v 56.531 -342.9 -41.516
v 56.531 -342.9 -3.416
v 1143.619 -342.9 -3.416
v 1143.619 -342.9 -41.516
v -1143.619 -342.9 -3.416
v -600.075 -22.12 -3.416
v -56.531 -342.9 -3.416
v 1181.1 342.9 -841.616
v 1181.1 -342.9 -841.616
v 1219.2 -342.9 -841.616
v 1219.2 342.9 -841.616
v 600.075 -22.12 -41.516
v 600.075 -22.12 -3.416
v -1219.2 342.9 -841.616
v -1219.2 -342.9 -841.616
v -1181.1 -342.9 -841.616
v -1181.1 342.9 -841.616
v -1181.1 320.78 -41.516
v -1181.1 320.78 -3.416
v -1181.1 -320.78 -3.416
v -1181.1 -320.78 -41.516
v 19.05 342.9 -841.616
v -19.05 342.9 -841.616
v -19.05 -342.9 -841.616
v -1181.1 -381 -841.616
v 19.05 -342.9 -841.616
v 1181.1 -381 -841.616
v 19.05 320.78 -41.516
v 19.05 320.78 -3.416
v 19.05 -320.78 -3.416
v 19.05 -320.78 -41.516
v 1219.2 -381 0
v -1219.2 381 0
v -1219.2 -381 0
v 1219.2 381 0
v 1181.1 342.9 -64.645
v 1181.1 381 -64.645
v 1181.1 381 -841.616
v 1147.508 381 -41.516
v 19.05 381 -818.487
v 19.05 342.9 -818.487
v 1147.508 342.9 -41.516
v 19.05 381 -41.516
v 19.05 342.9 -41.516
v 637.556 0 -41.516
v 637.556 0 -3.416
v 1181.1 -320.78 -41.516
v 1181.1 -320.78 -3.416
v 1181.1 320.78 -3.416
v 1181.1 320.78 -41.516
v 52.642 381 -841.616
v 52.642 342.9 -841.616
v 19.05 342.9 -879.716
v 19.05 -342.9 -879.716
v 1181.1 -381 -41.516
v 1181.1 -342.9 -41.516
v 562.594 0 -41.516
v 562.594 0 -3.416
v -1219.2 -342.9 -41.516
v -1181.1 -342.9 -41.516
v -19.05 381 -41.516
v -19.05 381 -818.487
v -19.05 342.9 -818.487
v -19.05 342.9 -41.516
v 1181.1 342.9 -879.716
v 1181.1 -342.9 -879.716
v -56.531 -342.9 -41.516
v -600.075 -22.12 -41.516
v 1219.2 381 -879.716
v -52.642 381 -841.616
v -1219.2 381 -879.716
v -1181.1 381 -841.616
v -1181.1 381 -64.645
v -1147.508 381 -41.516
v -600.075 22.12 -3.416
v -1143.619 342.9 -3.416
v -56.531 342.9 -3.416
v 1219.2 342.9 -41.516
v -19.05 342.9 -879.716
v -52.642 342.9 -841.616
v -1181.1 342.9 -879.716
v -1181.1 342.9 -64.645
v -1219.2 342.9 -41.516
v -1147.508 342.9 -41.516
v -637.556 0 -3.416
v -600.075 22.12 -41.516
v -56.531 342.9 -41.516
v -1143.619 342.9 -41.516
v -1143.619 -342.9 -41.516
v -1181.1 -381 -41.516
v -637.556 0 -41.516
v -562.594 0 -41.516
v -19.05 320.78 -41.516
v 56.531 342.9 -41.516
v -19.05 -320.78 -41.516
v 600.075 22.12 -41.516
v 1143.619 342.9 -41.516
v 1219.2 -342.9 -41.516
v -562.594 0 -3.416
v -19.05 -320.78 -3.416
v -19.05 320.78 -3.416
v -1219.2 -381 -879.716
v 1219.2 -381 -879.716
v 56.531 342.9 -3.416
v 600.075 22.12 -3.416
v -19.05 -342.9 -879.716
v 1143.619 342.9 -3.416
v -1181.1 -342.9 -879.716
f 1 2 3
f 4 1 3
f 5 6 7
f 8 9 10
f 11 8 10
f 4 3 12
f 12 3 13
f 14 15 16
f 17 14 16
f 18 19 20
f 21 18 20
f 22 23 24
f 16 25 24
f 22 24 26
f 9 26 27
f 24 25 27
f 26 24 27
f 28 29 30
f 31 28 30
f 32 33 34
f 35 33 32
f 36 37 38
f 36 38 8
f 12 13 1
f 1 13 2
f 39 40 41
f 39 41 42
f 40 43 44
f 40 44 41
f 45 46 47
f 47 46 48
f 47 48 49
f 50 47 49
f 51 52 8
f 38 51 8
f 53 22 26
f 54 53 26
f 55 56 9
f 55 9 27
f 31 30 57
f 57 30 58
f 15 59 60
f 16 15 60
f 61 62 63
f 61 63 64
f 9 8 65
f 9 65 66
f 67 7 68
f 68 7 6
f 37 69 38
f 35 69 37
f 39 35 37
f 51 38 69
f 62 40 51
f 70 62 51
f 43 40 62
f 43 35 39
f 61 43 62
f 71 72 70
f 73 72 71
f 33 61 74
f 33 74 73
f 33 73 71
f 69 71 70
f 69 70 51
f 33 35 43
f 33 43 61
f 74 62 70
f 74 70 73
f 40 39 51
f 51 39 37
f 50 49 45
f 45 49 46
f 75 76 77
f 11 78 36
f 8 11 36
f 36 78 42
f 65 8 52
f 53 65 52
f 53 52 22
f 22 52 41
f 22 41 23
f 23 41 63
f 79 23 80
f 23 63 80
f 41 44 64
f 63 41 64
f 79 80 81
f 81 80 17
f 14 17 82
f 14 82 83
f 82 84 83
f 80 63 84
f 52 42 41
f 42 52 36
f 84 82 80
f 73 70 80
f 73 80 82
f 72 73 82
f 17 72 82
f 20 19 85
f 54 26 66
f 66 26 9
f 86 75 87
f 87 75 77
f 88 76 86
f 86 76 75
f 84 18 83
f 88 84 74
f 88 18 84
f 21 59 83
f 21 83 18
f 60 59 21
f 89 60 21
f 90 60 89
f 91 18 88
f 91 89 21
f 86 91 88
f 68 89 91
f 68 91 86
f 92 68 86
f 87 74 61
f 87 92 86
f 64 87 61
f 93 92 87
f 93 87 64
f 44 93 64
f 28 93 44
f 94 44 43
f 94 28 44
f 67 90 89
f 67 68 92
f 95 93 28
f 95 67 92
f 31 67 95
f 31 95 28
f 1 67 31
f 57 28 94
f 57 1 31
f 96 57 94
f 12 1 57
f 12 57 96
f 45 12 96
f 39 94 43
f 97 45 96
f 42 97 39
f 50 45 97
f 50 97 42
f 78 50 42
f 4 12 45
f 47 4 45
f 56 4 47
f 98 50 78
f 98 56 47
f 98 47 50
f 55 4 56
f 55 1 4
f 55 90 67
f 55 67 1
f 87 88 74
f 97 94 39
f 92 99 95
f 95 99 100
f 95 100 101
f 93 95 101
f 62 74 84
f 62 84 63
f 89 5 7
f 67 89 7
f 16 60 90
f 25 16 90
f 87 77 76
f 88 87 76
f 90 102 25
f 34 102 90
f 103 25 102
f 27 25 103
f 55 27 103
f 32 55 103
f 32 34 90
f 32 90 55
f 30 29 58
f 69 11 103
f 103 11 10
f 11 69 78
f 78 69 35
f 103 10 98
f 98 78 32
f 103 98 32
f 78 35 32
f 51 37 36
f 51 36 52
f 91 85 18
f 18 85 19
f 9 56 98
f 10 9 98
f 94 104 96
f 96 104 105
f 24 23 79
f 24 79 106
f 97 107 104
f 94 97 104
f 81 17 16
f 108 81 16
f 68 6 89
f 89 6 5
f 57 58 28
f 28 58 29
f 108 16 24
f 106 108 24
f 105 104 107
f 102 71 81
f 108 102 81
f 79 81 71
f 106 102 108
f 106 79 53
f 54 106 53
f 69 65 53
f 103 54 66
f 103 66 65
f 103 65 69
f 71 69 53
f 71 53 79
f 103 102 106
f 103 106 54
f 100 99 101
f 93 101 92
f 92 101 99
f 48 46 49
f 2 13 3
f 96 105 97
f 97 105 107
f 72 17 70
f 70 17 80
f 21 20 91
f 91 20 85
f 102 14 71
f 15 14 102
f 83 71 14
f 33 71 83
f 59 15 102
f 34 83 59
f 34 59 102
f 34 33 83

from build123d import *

# Parameters (mm, degrees)
F0_W      = 2438.4
F0_H      = 762
F1_DEPTH  = 3.4163
F2_W      = 2438.4
F2_H      = 762
F3_DEPTH  = 38.1
F4_W      = 38.1
F4_H      = 38.1
F5_DEPTH  = 800.1
F6_W      = 2438.4
F6_H      = 762
F6_W_2    = 1162.05
F6_H_2    = 685.8
F7_DEPTH  = 38.1
F10_DEPTH = 38.1


with BuildPart() as f1:
    # F0 (on Top) → F1 (new body)
    with BuildSketch(Plane.XY):
        Rectangle(F0_W, F0_H)
    extrude(amount=-F1_DEPTH)

    # F2 (on face) → F3 (join)
    with BuildSketch(Plane(origin=(0, 0, -3.4163), x_dir=(1, 0, 0), z_dir=(0, 0, -1))):
        Rectangle(F2_W, F2_H)
        Polygon((-600.075, -22.1201055787), (-56.5312900084, -342.9), (-1143.6187099916, -342.9), align=None, mode=Mode.SUBTRACT)
        Polygon((600.075, -22.1201055787), (1143.6187099916, -342.9), (56.5312900084, -342.9), align=None, mode=Mode.SUBTRACT)
        Polygon((19.05, -320.7798944213), (19.05, 320.7798944213), (562.5937099916, 0), align=None, mode=Mode.SUBTRACT)
        Polygon((-1181.1, -320.7798944213), (-1181.1, 320.7798944213), (-637.5562900084, 0), align=None, mode=Mode.SUBTRACT)
        Polygon((-562.5937099916, 0), (-19.05, 320.7798944213), (-19.05, -320.7798944213), align=None, mode=Mode.SUBTRACT)
        Polygon((-1143.6187099916, 342.9), (-56.5312900084, 342.9), (-600.075, 22.1201055787), align=None, mode=Mode.SUBTRACT)
        Polygon((56.5312900084, 342.9), (1143.6187099916, 342.9), (600.075, 22.1201055787), align=None, mode=Mode.SUBTRACT)
        Polygon((637.5562900084, 0), (1181.1, 320.7798944213), (1181.1, -320.7798944213), align=None, mode=Mode.SUBTRACT)
    extrude(amount=F3_DEPTH)

    # F4 (on face) → F5 (join)
    with BuildSketch(Plane(origin=(0, 0, -41.5163), x_dir=(1, 0, 0), z_dir=(0, 0, -1))):
        with Locations((-1200.15, 361.95)):
            Rectangle(F4_W, F4_H)
        with Locations((-1200.15, -361.95)):
            Rectangle(F4_W, F4_H)
        with Locations((1200.15, -361.95)):
            Rectangle(F4_W, F4_H)
        with Locations((1200.15, 361.95)):
            Rectangle(F4_W, F4_H)
    extrude(amount=F5_DEPTH)

    # F6 (on face) → F7 (join)
    with BuildSketch(Plane(origin=(0, 0, -841.6163), x_dir=(1, 0, 0), z_dir=(0, 0, -1))):
        Rectangle(F6_W, F6_H)
        with Locations((-600.075, 0)):
            Rectangle(F6_W_2, F6_H_2, mode=Mode.SUBTRACT)
        with Locations((600.075, 0)):
            Rectangle(F6_W_2, F6_H_2, mode=Mode.SUBTRACT)
    extrude(amount=F7_DEPTH)

    # F9 (on 3pt) → F10 (join)
    with BuildSketch(Plane(origin=(0, 381, 0), x_dir=(-1, 0, 0), z_dir=(0, 1, 0))):
        Polygon((19.05, -818.4874808139), (19.05, -41.5163), (-19.05, -41.5163), (-19.05, -818.4874808139), (-1147.508143563, -41.5163), (-1181.1, -41.5163), (-1181.1, -64.645119186), (-52.6418564368, -841.6163), (-19.05, -841.6163), (19.05, -841.6163), (52.6418564369, -841.6163), (1181.1, -64.6451191861), (1181.1, -41.5163), (1147.5081435631, -41.5163), align=None)
    extrude(amount=-F10_DEPTH)


solid = f1.part
